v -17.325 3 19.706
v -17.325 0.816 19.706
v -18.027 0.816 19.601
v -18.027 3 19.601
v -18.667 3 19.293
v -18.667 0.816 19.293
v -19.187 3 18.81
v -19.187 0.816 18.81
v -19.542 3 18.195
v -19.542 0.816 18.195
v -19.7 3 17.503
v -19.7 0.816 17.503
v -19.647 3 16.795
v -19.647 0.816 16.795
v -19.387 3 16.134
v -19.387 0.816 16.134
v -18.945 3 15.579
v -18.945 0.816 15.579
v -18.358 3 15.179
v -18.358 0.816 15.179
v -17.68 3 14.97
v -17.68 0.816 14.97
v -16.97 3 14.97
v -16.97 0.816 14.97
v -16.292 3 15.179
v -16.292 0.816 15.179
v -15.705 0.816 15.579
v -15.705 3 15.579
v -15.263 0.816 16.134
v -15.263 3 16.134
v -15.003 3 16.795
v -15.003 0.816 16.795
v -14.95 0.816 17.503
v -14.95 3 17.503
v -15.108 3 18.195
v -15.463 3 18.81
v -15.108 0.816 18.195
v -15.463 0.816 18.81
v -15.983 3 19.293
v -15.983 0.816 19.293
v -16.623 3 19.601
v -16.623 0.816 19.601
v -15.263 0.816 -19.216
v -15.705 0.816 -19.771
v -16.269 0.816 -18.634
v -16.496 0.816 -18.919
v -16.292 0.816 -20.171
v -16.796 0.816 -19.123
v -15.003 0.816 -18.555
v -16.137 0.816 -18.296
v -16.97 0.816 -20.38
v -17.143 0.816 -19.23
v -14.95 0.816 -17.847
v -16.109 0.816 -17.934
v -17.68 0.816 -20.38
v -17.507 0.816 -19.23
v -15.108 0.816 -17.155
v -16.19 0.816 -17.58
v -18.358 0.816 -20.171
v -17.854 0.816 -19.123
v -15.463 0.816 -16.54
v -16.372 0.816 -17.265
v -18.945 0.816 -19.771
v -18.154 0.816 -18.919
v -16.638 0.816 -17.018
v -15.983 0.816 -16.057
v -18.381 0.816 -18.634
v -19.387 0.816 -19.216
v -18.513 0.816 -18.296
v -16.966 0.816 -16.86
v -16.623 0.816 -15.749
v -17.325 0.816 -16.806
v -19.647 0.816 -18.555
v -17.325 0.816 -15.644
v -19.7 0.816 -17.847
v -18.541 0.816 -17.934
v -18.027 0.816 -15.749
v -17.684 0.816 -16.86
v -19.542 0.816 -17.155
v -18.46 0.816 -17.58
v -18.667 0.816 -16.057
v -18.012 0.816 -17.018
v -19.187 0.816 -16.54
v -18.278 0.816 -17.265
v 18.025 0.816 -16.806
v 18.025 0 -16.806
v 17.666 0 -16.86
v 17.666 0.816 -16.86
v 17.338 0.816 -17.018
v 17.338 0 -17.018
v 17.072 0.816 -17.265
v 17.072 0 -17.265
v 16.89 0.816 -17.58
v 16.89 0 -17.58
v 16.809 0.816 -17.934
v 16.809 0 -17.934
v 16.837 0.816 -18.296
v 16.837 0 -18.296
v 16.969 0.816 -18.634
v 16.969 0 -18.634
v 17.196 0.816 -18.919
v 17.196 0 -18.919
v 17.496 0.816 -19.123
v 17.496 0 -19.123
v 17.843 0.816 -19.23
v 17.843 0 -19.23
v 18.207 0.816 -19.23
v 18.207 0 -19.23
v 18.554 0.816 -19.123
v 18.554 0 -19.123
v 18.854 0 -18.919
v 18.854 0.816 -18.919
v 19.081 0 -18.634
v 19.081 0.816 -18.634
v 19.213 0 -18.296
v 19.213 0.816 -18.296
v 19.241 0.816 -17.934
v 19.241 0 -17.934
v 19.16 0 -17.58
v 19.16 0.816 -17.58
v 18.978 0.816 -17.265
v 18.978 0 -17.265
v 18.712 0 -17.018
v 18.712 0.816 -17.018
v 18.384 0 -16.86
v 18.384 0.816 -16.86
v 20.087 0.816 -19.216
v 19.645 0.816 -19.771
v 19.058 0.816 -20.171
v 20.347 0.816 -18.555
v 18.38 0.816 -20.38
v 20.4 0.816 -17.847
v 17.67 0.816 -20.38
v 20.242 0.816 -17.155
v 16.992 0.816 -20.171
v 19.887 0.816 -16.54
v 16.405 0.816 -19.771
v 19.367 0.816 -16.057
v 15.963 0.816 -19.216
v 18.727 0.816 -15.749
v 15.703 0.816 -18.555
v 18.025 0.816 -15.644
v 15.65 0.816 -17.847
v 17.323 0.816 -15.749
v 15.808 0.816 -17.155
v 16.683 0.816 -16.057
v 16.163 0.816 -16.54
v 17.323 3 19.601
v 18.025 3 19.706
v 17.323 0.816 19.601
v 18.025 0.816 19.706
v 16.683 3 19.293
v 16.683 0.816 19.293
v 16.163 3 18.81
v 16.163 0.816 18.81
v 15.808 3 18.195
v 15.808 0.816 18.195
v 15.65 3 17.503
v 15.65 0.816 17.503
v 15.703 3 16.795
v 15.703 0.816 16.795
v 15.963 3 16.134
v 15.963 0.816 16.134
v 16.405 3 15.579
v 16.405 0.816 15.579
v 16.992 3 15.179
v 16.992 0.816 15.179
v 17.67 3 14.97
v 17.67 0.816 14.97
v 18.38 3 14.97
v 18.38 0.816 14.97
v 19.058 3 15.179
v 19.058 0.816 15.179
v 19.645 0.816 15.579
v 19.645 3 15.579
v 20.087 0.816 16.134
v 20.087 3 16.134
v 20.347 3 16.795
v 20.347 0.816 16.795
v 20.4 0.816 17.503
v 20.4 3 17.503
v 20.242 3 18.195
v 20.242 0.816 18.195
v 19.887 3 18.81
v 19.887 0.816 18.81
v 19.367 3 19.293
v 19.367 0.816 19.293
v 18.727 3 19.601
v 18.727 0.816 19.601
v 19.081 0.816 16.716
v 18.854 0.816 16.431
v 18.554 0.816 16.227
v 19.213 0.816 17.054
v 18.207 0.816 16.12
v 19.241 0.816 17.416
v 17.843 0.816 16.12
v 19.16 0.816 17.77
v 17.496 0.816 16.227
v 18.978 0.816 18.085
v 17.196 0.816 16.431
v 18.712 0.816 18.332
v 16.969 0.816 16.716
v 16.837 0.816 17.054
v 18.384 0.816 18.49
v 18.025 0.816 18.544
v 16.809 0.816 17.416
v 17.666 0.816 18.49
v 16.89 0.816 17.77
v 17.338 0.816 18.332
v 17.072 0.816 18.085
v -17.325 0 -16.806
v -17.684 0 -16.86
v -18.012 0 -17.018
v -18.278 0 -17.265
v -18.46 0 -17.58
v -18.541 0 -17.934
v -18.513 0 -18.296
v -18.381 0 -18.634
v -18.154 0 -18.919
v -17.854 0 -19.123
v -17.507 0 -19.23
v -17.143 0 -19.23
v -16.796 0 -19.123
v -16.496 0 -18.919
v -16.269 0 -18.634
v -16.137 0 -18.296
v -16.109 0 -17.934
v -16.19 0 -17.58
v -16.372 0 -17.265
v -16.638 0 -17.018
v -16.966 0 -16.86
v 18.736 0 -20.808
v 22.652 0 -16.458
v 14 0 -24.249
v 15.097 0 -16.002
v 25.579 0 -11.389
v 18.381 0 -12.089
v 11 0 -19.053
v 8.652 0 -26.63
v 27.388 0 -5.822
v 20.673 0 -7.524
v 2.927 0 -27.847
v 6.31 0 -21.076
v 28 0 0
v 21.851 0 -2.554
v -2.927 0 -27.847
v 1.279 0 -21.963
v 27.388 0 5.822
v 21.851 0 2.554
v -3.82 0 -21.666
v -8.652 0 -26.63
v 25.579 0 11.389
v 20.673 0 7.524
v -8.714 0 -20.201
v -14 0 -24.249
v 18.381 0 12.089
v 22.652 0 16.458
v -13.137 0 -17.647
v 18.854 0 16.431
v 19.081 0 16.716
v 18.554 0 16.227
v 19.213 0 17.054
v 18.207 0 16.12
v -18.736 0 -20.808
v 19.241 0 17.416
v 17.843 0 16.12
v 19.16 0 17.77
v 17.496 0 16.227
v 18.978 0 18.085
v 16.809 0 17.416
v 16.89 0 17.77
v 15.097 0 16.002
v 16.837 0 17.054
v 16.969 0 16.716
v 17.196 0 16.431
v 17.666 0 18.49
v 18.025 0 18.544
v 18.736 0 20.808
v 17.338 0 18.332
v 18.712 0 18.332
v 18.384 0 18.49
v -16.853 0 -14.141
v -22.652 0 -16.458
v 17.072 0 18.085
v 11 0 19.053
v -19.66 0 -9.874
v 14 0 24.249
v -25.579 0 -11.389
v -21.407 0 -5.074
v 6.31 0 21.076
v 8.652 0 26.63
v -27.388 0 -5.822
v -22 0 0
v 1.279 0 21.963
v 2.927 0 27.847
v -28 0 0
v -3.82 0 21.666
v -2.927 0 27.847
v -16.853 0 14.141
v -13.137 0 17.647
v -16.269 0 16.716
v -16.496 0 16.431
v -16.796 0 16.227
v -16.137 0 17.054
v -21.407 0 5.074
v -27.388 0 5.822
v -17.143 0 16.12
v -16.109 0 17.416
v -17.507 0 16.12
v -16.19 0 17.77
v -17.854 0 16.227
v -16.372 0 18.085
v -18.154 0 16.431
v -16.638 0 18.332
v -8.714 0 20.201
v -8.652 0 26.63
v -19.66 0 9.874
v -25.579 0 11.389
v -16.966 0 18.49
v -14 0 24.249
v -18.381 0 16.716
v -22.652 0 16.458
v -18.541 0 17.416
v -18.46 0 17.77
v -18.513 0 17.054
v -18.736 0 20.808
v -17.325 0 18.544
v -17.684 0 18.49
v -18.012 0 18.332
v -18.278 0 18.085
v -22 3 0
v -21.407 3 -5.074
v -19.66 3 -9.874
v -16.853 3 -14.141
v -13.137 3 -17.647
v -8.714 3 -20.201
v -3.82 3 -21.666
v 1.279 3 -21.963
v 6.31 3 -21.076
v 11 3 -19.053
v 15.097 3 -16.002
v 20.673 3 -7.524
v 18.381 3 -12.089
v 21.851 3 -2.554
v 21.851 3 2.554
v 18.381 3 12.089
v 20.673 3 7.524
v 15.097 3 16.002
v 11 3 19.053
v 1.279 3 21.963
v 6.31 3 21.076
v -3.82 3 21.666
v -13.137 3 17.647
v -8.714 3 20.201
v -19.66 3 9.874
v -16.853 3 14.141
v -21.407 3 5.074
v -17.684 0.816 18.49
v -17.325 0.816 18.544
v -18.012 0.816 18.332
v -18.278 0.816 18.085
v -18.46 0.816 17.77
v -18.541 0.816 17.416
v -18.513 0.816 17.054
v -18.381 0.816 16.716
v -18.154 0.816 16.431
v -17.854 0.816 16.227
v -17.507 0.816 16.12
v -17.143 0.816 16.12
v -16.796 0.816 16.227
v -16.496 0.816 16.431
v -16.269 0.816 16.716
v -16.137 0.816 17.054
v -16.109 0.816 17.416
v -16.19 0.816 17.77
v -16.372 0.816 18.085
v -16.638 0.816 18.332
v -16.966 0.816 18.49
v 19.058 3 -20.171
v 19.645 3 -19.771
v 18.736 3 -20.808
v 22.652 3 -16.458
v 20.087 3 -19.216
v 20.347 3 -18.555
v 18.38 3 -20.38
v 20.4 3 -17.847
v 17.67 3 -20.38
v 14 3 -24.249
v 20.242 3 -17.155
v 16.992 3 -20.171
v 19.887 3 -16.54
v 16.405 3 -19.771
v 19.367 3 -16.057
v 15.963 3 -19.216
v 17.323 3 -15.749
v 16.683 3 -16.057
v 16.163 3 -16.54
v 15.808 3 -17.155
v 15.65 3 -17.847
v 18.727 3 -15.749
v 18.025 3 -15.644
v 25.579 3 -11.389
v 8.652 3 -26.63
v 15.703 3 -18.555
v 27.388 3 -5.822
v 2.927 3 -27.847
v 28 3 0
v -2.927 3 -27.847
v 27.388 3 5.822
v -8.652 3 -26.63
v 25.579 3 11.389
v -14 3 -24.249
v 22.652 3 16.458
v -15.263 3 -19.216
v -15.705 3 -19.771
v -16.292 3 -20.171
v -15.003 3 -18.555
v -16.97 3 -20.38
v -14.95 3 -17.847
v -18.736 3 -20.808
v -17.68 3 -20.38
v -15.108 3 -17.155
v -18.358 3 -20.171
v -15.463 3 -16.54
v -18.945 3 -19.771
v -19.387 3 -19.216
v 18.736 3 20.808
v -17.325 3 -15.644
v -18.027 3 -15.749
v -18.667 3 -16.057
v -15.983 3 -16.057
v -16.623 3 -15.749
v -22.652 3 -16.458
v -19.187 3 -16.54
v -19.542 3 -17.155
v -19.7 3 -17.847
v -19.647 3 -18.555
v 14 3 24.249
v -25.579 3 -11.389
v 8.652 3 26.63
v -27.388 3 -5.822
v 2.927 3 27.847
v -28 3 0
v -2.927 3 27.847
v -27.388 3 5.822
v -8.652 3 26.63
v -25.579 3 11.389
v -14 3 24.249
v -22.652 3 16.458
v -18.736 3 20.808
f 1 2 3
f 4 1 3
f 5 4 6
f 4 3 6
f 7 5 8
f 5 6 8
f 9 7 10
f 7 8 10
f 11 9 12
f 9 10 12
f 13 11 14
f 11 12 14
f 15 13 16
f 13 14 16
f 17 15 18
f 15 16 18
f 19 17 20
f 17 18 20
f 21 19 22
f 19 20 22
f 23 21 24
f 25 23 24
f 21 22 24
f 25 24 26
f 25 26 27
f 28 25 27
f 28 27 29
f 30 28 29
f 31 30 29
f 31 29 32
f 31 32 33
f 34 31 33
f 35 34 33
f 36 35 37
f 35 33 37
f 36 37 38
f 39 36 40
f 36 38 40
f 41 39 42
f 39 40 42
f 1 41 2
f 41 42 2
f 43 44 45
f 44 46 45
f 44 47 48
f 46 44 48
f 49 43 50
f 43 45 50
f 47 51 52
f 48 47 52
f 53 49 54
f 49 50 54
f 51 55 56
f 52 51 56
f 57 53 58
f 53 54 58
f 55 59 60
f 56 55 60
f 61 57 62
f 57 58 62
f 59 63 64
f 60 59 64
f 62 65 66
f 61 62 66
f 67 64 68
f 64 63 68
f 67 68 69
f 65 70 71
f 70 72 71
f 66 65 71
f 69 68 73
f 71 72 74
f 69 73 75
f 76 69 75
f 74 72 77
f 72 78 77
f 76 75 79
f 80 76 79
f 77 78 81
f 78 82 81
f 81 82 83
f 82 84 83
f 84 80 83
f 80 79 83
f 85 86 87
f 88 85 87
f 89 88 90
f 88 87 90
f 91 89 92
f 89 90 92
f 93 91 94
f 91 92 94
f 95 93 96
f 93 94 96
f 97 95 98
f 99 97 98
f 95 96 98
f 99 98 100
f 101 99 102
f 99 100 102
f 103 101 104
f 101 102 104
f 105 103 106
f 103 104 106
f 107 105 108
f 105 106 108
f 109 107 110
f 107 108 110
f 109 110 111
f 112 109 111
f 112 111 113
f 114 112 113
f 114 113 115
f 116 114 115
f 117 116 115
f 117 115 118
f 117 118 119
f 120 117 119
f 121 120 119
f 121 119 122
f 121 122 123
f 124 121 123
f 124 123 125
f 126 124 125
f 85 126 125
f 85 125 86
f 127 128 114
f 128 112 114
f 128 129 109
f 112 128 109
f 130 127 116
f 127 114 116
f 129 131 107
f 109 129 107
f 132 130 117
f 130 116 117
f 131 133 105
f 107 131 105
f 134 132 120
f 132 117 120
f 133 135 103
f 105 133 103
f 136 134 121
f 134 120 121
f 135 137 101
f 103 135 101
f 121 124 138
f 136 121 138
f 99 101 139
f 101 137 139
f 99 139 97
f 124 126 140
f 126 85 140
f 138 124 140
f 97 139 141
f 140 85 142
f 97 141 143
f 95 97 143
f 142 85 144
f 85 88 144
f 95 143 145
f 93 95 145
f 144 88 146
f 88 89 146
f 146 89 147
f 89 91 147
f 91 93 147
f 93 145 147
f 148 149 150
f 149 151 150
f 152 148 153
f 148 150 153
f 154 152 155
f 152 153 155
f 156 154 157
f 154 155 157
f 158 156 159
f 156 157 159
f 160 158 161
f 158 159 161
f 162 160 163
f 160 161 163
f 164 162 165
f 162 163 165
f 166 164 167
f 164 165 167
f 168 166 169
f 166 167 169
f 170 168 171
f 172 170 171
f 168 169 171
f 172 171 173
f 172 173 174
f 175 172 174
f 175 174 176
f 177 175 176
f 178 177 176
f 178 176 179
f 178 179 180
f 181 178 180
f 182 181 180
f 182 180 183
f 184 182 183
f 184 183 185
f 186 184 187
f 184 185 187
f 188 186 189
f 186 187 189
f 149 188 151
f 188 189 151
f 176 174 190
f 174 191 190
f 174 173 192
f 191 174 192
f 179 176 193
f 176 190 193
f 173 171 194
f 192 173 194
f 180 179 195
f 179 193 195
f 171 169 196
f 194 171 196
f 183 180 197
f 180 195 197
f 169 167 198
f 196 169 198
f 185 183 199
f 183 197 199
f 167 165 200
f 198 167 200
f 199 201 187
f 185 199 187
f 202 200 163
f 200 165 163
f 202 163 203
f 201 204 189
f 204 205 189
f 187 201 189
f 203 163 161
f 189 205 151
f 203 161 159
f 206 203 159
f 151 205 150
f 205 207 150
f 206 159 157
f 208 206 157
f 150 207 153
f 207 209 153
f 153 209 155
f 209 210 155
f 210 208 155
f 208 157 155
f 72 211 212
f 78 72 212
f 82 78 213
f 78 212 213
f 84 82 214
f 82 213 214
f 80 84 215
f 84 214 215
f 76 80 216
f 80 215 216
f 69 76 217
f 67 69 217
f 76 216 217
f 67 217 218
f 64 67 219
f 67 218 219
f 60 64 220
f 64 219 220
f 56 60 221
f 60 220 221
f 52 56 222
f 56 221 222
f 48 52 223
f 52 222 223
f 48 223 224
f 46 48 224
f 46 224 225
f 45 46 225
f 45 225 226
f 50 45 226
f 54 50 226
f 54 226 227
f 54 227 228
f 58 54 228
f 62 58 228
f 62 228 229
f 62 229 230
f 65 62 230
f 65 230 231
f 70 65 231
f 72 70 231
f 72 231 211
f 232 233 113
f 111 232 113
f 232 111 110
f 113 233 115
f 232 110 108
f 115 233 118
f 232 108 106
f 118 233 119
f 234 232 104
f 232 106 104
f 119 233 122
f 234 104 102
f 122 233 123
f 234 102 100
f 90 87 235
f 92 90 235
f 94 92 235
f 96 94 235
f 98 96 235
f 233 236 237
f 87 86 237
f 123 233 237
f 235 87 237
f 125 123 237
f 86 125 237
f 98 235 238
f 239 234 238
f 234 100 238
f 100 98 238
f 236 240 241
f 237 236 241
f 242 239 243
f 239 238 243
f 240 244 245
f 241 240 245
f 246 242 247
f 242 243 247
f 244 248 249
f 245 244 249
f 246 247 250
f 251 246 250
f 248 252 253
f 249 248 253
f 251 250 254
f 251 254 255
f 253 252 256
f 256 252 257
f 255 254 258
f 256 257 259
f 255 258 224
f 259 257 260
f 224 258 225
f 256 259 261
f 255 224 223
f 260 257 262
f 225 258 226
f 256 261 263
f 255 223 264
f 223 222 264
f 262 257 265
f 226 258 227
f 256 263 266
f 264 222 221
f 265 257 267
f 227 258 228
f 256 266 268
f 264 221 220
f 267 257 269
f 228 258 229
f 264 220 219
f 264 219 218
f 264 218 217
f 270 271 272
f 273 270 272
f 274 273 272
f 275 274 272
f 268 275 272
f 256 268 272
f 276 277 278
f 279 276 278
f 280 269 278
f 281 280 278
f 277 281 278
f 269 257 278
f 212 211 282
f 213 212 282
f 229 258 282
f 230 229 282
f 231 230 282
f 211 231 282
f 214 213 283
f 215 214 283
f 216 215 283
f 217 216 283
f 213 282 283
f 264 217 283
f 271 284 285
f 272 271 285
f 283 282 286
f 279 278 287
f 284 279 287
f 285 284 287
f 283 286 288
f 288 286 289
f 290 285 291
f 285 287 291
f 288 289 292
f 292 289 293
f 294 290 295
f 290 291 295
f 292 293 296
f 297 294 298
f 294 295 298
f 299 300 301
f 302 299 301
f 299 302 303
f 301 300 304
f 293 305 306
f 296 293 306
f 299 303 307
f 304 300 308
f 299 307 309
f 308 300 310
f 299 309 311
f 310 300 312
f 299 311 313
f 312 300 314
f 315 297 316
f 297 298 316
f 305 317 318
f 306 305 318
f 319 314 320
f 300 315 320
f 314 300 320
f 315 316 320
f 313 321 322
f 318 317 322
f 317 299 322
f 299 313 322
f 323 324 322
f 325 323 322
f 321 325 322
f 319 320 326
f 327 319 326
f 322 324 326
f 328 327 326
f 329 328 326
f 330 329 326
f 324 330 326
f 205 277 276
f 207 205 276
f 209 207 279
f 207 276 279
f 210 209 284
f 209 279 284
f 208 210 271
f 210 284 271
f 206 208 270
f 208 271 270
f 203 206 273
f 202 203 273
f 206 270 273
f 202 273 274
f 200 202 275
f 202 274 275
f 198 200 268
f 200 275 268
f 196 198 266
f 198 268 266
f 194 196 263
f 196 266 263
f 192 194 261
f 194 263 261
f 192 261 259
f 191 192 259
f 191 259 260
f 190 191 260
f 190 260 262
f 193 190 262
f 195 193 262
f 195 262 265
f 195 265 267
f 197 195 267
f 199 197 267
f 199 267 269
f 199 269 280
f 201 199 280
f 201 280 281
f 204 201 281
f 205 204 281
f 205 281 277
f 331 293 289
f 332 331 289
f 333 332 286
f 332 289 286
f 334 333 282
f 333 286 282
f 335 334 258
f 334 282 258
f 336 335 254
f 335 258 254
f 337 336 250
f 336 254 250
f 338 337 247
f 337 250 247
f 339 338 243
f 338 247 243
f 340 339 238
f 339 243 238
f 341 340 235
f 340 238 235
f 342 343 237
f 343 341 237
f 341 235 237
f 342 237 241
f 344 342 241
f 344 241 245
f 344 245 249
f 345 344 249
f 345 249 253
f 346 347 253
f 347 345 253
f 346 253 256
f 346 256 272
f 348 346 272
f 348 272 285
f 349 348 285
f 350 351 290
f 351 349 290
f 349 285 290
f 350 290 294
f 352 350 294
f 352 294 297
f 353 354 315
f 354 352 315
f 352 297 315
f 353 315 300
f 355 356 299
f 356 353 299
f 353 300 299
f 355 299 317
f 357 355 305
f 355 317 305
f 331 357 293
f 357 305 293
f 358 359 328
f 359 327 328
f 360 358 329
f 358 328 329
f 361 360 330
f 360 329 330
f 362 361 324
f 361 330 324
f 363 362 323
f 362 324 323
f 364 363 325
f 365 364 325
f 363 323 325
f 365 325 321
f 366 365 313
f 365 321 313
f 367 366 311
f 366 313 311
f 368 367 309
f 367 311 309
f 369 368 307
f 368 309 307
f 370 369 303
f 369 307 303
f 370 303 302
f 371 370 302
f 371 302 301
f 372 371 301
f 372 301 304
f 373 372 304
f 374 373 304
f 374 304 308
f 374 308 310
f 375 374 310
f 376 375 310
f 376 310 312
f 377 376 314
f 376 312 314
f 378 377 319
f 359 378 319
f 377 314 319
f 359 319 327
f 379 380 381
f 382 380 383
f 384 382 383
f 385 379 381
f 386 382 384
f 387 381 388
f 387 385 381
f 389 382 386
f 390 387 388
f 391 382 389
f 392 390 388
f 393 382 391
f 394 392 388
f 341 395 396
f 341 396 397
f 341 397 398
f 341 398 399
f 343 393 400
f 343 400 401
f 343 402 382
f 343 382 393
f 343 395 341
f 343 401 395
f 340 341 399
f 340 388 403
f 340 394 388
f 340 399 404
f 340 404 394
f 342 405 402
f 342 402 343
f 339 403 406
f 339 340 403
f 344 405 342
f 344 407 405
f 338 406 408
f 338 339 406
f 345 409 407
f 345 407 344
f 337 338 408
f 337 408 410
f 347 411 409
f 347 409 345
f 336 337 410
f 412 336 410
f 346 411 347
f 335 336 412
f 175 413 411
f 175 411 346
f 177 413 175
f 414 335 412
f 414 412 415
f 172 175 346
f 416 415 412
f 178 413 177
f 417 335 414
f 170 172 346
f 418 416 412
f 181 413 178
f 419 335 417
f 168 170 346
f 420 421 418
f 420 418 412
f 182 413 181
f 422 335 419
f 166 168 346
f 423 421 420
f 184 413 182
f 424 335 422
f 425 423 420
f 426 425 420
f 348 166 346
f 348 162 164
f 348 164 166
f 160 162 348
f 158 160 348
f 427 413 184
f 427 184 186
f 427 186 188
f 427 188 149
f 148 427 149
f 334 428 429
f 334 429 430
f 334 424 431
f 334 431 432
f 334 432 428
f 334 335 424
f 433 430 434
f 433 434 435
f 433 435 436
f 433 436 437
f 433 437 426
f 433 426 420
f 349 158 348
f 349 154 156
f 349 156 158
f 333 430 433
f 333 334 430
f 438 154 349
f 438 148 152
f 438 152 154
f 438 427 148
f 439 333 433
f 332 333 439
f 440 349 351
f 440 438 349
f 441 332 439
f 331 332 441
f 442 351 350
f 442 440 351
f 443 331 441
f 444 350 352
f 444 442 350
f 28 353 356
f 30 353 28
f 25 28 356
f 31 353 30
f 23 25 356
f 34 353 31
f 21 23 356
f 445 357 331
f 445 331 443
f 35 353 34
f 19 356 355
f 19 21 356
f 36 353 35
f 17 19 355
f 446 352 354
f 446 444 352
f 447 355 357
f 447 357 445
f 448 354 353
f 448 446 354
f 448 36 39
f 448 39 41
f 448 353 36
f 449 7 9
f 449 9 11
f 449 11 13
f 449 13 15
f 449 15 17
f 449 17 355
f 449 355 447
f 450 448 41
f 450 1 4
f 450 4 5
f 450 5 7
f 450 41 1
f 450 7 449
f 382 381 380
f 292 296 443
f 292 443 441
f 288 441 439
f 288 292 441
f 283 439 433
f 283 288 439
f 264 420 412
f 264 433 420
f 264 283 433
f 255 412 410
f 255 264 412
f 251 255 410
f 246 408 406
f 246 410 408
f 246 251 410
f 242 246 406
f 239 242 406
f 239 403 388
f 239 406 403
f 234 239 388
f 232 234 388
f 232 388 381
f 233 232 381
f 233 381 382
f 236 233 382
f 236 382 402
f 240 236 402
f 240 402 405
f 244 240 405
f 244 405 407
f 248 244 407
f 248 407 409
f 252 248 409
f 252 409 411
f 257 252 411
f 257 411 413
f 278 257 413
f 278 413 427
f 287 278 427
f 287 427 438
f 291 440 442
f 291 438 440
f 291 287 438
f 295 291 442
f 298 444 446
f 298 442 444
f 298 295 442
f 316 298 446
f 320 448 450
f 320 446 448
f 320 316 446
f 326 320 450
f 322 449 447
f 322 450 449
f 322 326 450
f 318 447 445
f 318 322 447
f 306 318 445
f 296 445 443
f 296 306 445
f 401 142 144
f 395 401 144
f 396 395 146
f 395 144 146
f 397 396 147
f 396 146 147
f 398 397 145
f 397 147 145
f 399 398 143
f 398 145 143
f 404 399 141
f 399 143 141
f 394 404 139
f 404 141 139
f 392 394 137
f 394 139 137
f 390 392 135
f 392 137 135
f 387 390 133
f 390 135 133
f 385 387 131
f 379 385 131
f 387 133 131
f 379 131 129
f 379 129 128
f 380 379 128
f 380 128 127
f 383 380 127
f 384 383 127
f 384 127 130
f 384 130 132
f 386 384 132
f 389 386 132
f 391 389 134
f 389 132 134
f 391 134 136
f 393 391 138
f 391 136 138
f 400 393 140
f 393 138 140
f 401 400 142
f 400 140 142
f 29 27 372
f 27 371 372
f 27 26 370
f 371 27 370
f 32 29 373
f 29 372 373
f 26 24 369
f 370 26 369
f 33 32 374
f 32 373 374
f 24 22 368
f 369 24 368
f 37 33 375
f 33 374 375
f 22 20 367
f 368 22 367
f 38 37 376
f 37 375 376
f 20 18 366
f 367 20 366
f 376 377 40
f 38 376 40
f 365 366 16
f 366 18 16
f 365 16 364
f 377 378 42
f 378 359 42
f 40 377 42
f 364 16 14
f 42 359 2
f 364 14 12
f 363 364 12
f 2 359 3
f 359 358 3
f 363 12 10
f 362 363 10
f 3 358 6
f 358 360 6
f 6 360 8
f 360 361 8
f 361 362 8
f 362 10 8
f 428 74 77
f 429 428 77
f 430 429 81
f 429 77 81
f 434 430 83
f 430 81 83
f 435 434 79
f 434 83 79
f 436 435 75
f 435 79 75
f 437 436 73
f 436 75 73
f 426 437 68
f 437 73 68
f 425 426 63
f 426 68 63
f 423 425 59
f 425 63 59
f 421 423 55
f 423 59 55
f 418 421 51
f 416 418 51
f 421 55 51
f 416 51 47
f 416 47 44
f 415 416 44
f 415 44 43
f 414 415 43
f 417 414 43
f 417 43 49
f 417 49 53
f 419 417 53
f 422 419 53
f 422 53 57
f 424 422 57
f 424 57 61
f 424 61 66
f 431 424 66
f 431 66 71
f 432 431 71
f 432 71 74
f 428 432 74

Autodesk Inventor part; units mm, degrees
ref_plane "YZ Plane" through (0, 0, 0) normal (1, 0, 0) x (0, 1, 0)
ref_plane "XZ Plane" through (0, 0, 0) normal (0, 1, 0) x (-1, 0, 0)
ref_plane "XY Plane" through (0, 0, 0) normal (0, 0, 1) x (1, 0, 0)
sketch "Sketch1" plane through (0, 0, 0) normal (0, 1, 0) x (-1, 0, 0)
  circle A0 centre (0, 0) radius 22
  circle A1 centre (0, 0) radius 28
  dimension "d0" = 44
  dimension "d1" = 56
extrude "Extrusion1" add sketch "Sketch1" along normal blind 3
sketch "Sketch5" plane through (0, 3, 0) normal (0, 1, 0) x (1, 0, 0)
  line L0 (18.025, 18.025) -> (-17.325, 18.025)
  line L1 (-17.325, 18.025) -> (-17.325, -17.325)
  line L2 (-17.325, -17.325) -> (18.025, -17.325)
  line L3 (18.025, -17.325) -> (18.025, 18.025)
  point P0 (0, 0)
  dimension "d22" = 35.35
  dimension "d23" = 35.35
hole "Hole3" at (-17.325, 3, 17.325) at (-17.325, 3, -18.025) at (18.025, 3, -18.025) at (18.025, 3, 17.325) direction (0, -1, 0) diameter 2.438 end through all counterbore diameter 4.763 counterbore depth 2.184 clearance for "Socket Head Cap Screw" size "#2" standard "Ansi Unified Screw Threads"
properties part number "chamberPlateCircle"
